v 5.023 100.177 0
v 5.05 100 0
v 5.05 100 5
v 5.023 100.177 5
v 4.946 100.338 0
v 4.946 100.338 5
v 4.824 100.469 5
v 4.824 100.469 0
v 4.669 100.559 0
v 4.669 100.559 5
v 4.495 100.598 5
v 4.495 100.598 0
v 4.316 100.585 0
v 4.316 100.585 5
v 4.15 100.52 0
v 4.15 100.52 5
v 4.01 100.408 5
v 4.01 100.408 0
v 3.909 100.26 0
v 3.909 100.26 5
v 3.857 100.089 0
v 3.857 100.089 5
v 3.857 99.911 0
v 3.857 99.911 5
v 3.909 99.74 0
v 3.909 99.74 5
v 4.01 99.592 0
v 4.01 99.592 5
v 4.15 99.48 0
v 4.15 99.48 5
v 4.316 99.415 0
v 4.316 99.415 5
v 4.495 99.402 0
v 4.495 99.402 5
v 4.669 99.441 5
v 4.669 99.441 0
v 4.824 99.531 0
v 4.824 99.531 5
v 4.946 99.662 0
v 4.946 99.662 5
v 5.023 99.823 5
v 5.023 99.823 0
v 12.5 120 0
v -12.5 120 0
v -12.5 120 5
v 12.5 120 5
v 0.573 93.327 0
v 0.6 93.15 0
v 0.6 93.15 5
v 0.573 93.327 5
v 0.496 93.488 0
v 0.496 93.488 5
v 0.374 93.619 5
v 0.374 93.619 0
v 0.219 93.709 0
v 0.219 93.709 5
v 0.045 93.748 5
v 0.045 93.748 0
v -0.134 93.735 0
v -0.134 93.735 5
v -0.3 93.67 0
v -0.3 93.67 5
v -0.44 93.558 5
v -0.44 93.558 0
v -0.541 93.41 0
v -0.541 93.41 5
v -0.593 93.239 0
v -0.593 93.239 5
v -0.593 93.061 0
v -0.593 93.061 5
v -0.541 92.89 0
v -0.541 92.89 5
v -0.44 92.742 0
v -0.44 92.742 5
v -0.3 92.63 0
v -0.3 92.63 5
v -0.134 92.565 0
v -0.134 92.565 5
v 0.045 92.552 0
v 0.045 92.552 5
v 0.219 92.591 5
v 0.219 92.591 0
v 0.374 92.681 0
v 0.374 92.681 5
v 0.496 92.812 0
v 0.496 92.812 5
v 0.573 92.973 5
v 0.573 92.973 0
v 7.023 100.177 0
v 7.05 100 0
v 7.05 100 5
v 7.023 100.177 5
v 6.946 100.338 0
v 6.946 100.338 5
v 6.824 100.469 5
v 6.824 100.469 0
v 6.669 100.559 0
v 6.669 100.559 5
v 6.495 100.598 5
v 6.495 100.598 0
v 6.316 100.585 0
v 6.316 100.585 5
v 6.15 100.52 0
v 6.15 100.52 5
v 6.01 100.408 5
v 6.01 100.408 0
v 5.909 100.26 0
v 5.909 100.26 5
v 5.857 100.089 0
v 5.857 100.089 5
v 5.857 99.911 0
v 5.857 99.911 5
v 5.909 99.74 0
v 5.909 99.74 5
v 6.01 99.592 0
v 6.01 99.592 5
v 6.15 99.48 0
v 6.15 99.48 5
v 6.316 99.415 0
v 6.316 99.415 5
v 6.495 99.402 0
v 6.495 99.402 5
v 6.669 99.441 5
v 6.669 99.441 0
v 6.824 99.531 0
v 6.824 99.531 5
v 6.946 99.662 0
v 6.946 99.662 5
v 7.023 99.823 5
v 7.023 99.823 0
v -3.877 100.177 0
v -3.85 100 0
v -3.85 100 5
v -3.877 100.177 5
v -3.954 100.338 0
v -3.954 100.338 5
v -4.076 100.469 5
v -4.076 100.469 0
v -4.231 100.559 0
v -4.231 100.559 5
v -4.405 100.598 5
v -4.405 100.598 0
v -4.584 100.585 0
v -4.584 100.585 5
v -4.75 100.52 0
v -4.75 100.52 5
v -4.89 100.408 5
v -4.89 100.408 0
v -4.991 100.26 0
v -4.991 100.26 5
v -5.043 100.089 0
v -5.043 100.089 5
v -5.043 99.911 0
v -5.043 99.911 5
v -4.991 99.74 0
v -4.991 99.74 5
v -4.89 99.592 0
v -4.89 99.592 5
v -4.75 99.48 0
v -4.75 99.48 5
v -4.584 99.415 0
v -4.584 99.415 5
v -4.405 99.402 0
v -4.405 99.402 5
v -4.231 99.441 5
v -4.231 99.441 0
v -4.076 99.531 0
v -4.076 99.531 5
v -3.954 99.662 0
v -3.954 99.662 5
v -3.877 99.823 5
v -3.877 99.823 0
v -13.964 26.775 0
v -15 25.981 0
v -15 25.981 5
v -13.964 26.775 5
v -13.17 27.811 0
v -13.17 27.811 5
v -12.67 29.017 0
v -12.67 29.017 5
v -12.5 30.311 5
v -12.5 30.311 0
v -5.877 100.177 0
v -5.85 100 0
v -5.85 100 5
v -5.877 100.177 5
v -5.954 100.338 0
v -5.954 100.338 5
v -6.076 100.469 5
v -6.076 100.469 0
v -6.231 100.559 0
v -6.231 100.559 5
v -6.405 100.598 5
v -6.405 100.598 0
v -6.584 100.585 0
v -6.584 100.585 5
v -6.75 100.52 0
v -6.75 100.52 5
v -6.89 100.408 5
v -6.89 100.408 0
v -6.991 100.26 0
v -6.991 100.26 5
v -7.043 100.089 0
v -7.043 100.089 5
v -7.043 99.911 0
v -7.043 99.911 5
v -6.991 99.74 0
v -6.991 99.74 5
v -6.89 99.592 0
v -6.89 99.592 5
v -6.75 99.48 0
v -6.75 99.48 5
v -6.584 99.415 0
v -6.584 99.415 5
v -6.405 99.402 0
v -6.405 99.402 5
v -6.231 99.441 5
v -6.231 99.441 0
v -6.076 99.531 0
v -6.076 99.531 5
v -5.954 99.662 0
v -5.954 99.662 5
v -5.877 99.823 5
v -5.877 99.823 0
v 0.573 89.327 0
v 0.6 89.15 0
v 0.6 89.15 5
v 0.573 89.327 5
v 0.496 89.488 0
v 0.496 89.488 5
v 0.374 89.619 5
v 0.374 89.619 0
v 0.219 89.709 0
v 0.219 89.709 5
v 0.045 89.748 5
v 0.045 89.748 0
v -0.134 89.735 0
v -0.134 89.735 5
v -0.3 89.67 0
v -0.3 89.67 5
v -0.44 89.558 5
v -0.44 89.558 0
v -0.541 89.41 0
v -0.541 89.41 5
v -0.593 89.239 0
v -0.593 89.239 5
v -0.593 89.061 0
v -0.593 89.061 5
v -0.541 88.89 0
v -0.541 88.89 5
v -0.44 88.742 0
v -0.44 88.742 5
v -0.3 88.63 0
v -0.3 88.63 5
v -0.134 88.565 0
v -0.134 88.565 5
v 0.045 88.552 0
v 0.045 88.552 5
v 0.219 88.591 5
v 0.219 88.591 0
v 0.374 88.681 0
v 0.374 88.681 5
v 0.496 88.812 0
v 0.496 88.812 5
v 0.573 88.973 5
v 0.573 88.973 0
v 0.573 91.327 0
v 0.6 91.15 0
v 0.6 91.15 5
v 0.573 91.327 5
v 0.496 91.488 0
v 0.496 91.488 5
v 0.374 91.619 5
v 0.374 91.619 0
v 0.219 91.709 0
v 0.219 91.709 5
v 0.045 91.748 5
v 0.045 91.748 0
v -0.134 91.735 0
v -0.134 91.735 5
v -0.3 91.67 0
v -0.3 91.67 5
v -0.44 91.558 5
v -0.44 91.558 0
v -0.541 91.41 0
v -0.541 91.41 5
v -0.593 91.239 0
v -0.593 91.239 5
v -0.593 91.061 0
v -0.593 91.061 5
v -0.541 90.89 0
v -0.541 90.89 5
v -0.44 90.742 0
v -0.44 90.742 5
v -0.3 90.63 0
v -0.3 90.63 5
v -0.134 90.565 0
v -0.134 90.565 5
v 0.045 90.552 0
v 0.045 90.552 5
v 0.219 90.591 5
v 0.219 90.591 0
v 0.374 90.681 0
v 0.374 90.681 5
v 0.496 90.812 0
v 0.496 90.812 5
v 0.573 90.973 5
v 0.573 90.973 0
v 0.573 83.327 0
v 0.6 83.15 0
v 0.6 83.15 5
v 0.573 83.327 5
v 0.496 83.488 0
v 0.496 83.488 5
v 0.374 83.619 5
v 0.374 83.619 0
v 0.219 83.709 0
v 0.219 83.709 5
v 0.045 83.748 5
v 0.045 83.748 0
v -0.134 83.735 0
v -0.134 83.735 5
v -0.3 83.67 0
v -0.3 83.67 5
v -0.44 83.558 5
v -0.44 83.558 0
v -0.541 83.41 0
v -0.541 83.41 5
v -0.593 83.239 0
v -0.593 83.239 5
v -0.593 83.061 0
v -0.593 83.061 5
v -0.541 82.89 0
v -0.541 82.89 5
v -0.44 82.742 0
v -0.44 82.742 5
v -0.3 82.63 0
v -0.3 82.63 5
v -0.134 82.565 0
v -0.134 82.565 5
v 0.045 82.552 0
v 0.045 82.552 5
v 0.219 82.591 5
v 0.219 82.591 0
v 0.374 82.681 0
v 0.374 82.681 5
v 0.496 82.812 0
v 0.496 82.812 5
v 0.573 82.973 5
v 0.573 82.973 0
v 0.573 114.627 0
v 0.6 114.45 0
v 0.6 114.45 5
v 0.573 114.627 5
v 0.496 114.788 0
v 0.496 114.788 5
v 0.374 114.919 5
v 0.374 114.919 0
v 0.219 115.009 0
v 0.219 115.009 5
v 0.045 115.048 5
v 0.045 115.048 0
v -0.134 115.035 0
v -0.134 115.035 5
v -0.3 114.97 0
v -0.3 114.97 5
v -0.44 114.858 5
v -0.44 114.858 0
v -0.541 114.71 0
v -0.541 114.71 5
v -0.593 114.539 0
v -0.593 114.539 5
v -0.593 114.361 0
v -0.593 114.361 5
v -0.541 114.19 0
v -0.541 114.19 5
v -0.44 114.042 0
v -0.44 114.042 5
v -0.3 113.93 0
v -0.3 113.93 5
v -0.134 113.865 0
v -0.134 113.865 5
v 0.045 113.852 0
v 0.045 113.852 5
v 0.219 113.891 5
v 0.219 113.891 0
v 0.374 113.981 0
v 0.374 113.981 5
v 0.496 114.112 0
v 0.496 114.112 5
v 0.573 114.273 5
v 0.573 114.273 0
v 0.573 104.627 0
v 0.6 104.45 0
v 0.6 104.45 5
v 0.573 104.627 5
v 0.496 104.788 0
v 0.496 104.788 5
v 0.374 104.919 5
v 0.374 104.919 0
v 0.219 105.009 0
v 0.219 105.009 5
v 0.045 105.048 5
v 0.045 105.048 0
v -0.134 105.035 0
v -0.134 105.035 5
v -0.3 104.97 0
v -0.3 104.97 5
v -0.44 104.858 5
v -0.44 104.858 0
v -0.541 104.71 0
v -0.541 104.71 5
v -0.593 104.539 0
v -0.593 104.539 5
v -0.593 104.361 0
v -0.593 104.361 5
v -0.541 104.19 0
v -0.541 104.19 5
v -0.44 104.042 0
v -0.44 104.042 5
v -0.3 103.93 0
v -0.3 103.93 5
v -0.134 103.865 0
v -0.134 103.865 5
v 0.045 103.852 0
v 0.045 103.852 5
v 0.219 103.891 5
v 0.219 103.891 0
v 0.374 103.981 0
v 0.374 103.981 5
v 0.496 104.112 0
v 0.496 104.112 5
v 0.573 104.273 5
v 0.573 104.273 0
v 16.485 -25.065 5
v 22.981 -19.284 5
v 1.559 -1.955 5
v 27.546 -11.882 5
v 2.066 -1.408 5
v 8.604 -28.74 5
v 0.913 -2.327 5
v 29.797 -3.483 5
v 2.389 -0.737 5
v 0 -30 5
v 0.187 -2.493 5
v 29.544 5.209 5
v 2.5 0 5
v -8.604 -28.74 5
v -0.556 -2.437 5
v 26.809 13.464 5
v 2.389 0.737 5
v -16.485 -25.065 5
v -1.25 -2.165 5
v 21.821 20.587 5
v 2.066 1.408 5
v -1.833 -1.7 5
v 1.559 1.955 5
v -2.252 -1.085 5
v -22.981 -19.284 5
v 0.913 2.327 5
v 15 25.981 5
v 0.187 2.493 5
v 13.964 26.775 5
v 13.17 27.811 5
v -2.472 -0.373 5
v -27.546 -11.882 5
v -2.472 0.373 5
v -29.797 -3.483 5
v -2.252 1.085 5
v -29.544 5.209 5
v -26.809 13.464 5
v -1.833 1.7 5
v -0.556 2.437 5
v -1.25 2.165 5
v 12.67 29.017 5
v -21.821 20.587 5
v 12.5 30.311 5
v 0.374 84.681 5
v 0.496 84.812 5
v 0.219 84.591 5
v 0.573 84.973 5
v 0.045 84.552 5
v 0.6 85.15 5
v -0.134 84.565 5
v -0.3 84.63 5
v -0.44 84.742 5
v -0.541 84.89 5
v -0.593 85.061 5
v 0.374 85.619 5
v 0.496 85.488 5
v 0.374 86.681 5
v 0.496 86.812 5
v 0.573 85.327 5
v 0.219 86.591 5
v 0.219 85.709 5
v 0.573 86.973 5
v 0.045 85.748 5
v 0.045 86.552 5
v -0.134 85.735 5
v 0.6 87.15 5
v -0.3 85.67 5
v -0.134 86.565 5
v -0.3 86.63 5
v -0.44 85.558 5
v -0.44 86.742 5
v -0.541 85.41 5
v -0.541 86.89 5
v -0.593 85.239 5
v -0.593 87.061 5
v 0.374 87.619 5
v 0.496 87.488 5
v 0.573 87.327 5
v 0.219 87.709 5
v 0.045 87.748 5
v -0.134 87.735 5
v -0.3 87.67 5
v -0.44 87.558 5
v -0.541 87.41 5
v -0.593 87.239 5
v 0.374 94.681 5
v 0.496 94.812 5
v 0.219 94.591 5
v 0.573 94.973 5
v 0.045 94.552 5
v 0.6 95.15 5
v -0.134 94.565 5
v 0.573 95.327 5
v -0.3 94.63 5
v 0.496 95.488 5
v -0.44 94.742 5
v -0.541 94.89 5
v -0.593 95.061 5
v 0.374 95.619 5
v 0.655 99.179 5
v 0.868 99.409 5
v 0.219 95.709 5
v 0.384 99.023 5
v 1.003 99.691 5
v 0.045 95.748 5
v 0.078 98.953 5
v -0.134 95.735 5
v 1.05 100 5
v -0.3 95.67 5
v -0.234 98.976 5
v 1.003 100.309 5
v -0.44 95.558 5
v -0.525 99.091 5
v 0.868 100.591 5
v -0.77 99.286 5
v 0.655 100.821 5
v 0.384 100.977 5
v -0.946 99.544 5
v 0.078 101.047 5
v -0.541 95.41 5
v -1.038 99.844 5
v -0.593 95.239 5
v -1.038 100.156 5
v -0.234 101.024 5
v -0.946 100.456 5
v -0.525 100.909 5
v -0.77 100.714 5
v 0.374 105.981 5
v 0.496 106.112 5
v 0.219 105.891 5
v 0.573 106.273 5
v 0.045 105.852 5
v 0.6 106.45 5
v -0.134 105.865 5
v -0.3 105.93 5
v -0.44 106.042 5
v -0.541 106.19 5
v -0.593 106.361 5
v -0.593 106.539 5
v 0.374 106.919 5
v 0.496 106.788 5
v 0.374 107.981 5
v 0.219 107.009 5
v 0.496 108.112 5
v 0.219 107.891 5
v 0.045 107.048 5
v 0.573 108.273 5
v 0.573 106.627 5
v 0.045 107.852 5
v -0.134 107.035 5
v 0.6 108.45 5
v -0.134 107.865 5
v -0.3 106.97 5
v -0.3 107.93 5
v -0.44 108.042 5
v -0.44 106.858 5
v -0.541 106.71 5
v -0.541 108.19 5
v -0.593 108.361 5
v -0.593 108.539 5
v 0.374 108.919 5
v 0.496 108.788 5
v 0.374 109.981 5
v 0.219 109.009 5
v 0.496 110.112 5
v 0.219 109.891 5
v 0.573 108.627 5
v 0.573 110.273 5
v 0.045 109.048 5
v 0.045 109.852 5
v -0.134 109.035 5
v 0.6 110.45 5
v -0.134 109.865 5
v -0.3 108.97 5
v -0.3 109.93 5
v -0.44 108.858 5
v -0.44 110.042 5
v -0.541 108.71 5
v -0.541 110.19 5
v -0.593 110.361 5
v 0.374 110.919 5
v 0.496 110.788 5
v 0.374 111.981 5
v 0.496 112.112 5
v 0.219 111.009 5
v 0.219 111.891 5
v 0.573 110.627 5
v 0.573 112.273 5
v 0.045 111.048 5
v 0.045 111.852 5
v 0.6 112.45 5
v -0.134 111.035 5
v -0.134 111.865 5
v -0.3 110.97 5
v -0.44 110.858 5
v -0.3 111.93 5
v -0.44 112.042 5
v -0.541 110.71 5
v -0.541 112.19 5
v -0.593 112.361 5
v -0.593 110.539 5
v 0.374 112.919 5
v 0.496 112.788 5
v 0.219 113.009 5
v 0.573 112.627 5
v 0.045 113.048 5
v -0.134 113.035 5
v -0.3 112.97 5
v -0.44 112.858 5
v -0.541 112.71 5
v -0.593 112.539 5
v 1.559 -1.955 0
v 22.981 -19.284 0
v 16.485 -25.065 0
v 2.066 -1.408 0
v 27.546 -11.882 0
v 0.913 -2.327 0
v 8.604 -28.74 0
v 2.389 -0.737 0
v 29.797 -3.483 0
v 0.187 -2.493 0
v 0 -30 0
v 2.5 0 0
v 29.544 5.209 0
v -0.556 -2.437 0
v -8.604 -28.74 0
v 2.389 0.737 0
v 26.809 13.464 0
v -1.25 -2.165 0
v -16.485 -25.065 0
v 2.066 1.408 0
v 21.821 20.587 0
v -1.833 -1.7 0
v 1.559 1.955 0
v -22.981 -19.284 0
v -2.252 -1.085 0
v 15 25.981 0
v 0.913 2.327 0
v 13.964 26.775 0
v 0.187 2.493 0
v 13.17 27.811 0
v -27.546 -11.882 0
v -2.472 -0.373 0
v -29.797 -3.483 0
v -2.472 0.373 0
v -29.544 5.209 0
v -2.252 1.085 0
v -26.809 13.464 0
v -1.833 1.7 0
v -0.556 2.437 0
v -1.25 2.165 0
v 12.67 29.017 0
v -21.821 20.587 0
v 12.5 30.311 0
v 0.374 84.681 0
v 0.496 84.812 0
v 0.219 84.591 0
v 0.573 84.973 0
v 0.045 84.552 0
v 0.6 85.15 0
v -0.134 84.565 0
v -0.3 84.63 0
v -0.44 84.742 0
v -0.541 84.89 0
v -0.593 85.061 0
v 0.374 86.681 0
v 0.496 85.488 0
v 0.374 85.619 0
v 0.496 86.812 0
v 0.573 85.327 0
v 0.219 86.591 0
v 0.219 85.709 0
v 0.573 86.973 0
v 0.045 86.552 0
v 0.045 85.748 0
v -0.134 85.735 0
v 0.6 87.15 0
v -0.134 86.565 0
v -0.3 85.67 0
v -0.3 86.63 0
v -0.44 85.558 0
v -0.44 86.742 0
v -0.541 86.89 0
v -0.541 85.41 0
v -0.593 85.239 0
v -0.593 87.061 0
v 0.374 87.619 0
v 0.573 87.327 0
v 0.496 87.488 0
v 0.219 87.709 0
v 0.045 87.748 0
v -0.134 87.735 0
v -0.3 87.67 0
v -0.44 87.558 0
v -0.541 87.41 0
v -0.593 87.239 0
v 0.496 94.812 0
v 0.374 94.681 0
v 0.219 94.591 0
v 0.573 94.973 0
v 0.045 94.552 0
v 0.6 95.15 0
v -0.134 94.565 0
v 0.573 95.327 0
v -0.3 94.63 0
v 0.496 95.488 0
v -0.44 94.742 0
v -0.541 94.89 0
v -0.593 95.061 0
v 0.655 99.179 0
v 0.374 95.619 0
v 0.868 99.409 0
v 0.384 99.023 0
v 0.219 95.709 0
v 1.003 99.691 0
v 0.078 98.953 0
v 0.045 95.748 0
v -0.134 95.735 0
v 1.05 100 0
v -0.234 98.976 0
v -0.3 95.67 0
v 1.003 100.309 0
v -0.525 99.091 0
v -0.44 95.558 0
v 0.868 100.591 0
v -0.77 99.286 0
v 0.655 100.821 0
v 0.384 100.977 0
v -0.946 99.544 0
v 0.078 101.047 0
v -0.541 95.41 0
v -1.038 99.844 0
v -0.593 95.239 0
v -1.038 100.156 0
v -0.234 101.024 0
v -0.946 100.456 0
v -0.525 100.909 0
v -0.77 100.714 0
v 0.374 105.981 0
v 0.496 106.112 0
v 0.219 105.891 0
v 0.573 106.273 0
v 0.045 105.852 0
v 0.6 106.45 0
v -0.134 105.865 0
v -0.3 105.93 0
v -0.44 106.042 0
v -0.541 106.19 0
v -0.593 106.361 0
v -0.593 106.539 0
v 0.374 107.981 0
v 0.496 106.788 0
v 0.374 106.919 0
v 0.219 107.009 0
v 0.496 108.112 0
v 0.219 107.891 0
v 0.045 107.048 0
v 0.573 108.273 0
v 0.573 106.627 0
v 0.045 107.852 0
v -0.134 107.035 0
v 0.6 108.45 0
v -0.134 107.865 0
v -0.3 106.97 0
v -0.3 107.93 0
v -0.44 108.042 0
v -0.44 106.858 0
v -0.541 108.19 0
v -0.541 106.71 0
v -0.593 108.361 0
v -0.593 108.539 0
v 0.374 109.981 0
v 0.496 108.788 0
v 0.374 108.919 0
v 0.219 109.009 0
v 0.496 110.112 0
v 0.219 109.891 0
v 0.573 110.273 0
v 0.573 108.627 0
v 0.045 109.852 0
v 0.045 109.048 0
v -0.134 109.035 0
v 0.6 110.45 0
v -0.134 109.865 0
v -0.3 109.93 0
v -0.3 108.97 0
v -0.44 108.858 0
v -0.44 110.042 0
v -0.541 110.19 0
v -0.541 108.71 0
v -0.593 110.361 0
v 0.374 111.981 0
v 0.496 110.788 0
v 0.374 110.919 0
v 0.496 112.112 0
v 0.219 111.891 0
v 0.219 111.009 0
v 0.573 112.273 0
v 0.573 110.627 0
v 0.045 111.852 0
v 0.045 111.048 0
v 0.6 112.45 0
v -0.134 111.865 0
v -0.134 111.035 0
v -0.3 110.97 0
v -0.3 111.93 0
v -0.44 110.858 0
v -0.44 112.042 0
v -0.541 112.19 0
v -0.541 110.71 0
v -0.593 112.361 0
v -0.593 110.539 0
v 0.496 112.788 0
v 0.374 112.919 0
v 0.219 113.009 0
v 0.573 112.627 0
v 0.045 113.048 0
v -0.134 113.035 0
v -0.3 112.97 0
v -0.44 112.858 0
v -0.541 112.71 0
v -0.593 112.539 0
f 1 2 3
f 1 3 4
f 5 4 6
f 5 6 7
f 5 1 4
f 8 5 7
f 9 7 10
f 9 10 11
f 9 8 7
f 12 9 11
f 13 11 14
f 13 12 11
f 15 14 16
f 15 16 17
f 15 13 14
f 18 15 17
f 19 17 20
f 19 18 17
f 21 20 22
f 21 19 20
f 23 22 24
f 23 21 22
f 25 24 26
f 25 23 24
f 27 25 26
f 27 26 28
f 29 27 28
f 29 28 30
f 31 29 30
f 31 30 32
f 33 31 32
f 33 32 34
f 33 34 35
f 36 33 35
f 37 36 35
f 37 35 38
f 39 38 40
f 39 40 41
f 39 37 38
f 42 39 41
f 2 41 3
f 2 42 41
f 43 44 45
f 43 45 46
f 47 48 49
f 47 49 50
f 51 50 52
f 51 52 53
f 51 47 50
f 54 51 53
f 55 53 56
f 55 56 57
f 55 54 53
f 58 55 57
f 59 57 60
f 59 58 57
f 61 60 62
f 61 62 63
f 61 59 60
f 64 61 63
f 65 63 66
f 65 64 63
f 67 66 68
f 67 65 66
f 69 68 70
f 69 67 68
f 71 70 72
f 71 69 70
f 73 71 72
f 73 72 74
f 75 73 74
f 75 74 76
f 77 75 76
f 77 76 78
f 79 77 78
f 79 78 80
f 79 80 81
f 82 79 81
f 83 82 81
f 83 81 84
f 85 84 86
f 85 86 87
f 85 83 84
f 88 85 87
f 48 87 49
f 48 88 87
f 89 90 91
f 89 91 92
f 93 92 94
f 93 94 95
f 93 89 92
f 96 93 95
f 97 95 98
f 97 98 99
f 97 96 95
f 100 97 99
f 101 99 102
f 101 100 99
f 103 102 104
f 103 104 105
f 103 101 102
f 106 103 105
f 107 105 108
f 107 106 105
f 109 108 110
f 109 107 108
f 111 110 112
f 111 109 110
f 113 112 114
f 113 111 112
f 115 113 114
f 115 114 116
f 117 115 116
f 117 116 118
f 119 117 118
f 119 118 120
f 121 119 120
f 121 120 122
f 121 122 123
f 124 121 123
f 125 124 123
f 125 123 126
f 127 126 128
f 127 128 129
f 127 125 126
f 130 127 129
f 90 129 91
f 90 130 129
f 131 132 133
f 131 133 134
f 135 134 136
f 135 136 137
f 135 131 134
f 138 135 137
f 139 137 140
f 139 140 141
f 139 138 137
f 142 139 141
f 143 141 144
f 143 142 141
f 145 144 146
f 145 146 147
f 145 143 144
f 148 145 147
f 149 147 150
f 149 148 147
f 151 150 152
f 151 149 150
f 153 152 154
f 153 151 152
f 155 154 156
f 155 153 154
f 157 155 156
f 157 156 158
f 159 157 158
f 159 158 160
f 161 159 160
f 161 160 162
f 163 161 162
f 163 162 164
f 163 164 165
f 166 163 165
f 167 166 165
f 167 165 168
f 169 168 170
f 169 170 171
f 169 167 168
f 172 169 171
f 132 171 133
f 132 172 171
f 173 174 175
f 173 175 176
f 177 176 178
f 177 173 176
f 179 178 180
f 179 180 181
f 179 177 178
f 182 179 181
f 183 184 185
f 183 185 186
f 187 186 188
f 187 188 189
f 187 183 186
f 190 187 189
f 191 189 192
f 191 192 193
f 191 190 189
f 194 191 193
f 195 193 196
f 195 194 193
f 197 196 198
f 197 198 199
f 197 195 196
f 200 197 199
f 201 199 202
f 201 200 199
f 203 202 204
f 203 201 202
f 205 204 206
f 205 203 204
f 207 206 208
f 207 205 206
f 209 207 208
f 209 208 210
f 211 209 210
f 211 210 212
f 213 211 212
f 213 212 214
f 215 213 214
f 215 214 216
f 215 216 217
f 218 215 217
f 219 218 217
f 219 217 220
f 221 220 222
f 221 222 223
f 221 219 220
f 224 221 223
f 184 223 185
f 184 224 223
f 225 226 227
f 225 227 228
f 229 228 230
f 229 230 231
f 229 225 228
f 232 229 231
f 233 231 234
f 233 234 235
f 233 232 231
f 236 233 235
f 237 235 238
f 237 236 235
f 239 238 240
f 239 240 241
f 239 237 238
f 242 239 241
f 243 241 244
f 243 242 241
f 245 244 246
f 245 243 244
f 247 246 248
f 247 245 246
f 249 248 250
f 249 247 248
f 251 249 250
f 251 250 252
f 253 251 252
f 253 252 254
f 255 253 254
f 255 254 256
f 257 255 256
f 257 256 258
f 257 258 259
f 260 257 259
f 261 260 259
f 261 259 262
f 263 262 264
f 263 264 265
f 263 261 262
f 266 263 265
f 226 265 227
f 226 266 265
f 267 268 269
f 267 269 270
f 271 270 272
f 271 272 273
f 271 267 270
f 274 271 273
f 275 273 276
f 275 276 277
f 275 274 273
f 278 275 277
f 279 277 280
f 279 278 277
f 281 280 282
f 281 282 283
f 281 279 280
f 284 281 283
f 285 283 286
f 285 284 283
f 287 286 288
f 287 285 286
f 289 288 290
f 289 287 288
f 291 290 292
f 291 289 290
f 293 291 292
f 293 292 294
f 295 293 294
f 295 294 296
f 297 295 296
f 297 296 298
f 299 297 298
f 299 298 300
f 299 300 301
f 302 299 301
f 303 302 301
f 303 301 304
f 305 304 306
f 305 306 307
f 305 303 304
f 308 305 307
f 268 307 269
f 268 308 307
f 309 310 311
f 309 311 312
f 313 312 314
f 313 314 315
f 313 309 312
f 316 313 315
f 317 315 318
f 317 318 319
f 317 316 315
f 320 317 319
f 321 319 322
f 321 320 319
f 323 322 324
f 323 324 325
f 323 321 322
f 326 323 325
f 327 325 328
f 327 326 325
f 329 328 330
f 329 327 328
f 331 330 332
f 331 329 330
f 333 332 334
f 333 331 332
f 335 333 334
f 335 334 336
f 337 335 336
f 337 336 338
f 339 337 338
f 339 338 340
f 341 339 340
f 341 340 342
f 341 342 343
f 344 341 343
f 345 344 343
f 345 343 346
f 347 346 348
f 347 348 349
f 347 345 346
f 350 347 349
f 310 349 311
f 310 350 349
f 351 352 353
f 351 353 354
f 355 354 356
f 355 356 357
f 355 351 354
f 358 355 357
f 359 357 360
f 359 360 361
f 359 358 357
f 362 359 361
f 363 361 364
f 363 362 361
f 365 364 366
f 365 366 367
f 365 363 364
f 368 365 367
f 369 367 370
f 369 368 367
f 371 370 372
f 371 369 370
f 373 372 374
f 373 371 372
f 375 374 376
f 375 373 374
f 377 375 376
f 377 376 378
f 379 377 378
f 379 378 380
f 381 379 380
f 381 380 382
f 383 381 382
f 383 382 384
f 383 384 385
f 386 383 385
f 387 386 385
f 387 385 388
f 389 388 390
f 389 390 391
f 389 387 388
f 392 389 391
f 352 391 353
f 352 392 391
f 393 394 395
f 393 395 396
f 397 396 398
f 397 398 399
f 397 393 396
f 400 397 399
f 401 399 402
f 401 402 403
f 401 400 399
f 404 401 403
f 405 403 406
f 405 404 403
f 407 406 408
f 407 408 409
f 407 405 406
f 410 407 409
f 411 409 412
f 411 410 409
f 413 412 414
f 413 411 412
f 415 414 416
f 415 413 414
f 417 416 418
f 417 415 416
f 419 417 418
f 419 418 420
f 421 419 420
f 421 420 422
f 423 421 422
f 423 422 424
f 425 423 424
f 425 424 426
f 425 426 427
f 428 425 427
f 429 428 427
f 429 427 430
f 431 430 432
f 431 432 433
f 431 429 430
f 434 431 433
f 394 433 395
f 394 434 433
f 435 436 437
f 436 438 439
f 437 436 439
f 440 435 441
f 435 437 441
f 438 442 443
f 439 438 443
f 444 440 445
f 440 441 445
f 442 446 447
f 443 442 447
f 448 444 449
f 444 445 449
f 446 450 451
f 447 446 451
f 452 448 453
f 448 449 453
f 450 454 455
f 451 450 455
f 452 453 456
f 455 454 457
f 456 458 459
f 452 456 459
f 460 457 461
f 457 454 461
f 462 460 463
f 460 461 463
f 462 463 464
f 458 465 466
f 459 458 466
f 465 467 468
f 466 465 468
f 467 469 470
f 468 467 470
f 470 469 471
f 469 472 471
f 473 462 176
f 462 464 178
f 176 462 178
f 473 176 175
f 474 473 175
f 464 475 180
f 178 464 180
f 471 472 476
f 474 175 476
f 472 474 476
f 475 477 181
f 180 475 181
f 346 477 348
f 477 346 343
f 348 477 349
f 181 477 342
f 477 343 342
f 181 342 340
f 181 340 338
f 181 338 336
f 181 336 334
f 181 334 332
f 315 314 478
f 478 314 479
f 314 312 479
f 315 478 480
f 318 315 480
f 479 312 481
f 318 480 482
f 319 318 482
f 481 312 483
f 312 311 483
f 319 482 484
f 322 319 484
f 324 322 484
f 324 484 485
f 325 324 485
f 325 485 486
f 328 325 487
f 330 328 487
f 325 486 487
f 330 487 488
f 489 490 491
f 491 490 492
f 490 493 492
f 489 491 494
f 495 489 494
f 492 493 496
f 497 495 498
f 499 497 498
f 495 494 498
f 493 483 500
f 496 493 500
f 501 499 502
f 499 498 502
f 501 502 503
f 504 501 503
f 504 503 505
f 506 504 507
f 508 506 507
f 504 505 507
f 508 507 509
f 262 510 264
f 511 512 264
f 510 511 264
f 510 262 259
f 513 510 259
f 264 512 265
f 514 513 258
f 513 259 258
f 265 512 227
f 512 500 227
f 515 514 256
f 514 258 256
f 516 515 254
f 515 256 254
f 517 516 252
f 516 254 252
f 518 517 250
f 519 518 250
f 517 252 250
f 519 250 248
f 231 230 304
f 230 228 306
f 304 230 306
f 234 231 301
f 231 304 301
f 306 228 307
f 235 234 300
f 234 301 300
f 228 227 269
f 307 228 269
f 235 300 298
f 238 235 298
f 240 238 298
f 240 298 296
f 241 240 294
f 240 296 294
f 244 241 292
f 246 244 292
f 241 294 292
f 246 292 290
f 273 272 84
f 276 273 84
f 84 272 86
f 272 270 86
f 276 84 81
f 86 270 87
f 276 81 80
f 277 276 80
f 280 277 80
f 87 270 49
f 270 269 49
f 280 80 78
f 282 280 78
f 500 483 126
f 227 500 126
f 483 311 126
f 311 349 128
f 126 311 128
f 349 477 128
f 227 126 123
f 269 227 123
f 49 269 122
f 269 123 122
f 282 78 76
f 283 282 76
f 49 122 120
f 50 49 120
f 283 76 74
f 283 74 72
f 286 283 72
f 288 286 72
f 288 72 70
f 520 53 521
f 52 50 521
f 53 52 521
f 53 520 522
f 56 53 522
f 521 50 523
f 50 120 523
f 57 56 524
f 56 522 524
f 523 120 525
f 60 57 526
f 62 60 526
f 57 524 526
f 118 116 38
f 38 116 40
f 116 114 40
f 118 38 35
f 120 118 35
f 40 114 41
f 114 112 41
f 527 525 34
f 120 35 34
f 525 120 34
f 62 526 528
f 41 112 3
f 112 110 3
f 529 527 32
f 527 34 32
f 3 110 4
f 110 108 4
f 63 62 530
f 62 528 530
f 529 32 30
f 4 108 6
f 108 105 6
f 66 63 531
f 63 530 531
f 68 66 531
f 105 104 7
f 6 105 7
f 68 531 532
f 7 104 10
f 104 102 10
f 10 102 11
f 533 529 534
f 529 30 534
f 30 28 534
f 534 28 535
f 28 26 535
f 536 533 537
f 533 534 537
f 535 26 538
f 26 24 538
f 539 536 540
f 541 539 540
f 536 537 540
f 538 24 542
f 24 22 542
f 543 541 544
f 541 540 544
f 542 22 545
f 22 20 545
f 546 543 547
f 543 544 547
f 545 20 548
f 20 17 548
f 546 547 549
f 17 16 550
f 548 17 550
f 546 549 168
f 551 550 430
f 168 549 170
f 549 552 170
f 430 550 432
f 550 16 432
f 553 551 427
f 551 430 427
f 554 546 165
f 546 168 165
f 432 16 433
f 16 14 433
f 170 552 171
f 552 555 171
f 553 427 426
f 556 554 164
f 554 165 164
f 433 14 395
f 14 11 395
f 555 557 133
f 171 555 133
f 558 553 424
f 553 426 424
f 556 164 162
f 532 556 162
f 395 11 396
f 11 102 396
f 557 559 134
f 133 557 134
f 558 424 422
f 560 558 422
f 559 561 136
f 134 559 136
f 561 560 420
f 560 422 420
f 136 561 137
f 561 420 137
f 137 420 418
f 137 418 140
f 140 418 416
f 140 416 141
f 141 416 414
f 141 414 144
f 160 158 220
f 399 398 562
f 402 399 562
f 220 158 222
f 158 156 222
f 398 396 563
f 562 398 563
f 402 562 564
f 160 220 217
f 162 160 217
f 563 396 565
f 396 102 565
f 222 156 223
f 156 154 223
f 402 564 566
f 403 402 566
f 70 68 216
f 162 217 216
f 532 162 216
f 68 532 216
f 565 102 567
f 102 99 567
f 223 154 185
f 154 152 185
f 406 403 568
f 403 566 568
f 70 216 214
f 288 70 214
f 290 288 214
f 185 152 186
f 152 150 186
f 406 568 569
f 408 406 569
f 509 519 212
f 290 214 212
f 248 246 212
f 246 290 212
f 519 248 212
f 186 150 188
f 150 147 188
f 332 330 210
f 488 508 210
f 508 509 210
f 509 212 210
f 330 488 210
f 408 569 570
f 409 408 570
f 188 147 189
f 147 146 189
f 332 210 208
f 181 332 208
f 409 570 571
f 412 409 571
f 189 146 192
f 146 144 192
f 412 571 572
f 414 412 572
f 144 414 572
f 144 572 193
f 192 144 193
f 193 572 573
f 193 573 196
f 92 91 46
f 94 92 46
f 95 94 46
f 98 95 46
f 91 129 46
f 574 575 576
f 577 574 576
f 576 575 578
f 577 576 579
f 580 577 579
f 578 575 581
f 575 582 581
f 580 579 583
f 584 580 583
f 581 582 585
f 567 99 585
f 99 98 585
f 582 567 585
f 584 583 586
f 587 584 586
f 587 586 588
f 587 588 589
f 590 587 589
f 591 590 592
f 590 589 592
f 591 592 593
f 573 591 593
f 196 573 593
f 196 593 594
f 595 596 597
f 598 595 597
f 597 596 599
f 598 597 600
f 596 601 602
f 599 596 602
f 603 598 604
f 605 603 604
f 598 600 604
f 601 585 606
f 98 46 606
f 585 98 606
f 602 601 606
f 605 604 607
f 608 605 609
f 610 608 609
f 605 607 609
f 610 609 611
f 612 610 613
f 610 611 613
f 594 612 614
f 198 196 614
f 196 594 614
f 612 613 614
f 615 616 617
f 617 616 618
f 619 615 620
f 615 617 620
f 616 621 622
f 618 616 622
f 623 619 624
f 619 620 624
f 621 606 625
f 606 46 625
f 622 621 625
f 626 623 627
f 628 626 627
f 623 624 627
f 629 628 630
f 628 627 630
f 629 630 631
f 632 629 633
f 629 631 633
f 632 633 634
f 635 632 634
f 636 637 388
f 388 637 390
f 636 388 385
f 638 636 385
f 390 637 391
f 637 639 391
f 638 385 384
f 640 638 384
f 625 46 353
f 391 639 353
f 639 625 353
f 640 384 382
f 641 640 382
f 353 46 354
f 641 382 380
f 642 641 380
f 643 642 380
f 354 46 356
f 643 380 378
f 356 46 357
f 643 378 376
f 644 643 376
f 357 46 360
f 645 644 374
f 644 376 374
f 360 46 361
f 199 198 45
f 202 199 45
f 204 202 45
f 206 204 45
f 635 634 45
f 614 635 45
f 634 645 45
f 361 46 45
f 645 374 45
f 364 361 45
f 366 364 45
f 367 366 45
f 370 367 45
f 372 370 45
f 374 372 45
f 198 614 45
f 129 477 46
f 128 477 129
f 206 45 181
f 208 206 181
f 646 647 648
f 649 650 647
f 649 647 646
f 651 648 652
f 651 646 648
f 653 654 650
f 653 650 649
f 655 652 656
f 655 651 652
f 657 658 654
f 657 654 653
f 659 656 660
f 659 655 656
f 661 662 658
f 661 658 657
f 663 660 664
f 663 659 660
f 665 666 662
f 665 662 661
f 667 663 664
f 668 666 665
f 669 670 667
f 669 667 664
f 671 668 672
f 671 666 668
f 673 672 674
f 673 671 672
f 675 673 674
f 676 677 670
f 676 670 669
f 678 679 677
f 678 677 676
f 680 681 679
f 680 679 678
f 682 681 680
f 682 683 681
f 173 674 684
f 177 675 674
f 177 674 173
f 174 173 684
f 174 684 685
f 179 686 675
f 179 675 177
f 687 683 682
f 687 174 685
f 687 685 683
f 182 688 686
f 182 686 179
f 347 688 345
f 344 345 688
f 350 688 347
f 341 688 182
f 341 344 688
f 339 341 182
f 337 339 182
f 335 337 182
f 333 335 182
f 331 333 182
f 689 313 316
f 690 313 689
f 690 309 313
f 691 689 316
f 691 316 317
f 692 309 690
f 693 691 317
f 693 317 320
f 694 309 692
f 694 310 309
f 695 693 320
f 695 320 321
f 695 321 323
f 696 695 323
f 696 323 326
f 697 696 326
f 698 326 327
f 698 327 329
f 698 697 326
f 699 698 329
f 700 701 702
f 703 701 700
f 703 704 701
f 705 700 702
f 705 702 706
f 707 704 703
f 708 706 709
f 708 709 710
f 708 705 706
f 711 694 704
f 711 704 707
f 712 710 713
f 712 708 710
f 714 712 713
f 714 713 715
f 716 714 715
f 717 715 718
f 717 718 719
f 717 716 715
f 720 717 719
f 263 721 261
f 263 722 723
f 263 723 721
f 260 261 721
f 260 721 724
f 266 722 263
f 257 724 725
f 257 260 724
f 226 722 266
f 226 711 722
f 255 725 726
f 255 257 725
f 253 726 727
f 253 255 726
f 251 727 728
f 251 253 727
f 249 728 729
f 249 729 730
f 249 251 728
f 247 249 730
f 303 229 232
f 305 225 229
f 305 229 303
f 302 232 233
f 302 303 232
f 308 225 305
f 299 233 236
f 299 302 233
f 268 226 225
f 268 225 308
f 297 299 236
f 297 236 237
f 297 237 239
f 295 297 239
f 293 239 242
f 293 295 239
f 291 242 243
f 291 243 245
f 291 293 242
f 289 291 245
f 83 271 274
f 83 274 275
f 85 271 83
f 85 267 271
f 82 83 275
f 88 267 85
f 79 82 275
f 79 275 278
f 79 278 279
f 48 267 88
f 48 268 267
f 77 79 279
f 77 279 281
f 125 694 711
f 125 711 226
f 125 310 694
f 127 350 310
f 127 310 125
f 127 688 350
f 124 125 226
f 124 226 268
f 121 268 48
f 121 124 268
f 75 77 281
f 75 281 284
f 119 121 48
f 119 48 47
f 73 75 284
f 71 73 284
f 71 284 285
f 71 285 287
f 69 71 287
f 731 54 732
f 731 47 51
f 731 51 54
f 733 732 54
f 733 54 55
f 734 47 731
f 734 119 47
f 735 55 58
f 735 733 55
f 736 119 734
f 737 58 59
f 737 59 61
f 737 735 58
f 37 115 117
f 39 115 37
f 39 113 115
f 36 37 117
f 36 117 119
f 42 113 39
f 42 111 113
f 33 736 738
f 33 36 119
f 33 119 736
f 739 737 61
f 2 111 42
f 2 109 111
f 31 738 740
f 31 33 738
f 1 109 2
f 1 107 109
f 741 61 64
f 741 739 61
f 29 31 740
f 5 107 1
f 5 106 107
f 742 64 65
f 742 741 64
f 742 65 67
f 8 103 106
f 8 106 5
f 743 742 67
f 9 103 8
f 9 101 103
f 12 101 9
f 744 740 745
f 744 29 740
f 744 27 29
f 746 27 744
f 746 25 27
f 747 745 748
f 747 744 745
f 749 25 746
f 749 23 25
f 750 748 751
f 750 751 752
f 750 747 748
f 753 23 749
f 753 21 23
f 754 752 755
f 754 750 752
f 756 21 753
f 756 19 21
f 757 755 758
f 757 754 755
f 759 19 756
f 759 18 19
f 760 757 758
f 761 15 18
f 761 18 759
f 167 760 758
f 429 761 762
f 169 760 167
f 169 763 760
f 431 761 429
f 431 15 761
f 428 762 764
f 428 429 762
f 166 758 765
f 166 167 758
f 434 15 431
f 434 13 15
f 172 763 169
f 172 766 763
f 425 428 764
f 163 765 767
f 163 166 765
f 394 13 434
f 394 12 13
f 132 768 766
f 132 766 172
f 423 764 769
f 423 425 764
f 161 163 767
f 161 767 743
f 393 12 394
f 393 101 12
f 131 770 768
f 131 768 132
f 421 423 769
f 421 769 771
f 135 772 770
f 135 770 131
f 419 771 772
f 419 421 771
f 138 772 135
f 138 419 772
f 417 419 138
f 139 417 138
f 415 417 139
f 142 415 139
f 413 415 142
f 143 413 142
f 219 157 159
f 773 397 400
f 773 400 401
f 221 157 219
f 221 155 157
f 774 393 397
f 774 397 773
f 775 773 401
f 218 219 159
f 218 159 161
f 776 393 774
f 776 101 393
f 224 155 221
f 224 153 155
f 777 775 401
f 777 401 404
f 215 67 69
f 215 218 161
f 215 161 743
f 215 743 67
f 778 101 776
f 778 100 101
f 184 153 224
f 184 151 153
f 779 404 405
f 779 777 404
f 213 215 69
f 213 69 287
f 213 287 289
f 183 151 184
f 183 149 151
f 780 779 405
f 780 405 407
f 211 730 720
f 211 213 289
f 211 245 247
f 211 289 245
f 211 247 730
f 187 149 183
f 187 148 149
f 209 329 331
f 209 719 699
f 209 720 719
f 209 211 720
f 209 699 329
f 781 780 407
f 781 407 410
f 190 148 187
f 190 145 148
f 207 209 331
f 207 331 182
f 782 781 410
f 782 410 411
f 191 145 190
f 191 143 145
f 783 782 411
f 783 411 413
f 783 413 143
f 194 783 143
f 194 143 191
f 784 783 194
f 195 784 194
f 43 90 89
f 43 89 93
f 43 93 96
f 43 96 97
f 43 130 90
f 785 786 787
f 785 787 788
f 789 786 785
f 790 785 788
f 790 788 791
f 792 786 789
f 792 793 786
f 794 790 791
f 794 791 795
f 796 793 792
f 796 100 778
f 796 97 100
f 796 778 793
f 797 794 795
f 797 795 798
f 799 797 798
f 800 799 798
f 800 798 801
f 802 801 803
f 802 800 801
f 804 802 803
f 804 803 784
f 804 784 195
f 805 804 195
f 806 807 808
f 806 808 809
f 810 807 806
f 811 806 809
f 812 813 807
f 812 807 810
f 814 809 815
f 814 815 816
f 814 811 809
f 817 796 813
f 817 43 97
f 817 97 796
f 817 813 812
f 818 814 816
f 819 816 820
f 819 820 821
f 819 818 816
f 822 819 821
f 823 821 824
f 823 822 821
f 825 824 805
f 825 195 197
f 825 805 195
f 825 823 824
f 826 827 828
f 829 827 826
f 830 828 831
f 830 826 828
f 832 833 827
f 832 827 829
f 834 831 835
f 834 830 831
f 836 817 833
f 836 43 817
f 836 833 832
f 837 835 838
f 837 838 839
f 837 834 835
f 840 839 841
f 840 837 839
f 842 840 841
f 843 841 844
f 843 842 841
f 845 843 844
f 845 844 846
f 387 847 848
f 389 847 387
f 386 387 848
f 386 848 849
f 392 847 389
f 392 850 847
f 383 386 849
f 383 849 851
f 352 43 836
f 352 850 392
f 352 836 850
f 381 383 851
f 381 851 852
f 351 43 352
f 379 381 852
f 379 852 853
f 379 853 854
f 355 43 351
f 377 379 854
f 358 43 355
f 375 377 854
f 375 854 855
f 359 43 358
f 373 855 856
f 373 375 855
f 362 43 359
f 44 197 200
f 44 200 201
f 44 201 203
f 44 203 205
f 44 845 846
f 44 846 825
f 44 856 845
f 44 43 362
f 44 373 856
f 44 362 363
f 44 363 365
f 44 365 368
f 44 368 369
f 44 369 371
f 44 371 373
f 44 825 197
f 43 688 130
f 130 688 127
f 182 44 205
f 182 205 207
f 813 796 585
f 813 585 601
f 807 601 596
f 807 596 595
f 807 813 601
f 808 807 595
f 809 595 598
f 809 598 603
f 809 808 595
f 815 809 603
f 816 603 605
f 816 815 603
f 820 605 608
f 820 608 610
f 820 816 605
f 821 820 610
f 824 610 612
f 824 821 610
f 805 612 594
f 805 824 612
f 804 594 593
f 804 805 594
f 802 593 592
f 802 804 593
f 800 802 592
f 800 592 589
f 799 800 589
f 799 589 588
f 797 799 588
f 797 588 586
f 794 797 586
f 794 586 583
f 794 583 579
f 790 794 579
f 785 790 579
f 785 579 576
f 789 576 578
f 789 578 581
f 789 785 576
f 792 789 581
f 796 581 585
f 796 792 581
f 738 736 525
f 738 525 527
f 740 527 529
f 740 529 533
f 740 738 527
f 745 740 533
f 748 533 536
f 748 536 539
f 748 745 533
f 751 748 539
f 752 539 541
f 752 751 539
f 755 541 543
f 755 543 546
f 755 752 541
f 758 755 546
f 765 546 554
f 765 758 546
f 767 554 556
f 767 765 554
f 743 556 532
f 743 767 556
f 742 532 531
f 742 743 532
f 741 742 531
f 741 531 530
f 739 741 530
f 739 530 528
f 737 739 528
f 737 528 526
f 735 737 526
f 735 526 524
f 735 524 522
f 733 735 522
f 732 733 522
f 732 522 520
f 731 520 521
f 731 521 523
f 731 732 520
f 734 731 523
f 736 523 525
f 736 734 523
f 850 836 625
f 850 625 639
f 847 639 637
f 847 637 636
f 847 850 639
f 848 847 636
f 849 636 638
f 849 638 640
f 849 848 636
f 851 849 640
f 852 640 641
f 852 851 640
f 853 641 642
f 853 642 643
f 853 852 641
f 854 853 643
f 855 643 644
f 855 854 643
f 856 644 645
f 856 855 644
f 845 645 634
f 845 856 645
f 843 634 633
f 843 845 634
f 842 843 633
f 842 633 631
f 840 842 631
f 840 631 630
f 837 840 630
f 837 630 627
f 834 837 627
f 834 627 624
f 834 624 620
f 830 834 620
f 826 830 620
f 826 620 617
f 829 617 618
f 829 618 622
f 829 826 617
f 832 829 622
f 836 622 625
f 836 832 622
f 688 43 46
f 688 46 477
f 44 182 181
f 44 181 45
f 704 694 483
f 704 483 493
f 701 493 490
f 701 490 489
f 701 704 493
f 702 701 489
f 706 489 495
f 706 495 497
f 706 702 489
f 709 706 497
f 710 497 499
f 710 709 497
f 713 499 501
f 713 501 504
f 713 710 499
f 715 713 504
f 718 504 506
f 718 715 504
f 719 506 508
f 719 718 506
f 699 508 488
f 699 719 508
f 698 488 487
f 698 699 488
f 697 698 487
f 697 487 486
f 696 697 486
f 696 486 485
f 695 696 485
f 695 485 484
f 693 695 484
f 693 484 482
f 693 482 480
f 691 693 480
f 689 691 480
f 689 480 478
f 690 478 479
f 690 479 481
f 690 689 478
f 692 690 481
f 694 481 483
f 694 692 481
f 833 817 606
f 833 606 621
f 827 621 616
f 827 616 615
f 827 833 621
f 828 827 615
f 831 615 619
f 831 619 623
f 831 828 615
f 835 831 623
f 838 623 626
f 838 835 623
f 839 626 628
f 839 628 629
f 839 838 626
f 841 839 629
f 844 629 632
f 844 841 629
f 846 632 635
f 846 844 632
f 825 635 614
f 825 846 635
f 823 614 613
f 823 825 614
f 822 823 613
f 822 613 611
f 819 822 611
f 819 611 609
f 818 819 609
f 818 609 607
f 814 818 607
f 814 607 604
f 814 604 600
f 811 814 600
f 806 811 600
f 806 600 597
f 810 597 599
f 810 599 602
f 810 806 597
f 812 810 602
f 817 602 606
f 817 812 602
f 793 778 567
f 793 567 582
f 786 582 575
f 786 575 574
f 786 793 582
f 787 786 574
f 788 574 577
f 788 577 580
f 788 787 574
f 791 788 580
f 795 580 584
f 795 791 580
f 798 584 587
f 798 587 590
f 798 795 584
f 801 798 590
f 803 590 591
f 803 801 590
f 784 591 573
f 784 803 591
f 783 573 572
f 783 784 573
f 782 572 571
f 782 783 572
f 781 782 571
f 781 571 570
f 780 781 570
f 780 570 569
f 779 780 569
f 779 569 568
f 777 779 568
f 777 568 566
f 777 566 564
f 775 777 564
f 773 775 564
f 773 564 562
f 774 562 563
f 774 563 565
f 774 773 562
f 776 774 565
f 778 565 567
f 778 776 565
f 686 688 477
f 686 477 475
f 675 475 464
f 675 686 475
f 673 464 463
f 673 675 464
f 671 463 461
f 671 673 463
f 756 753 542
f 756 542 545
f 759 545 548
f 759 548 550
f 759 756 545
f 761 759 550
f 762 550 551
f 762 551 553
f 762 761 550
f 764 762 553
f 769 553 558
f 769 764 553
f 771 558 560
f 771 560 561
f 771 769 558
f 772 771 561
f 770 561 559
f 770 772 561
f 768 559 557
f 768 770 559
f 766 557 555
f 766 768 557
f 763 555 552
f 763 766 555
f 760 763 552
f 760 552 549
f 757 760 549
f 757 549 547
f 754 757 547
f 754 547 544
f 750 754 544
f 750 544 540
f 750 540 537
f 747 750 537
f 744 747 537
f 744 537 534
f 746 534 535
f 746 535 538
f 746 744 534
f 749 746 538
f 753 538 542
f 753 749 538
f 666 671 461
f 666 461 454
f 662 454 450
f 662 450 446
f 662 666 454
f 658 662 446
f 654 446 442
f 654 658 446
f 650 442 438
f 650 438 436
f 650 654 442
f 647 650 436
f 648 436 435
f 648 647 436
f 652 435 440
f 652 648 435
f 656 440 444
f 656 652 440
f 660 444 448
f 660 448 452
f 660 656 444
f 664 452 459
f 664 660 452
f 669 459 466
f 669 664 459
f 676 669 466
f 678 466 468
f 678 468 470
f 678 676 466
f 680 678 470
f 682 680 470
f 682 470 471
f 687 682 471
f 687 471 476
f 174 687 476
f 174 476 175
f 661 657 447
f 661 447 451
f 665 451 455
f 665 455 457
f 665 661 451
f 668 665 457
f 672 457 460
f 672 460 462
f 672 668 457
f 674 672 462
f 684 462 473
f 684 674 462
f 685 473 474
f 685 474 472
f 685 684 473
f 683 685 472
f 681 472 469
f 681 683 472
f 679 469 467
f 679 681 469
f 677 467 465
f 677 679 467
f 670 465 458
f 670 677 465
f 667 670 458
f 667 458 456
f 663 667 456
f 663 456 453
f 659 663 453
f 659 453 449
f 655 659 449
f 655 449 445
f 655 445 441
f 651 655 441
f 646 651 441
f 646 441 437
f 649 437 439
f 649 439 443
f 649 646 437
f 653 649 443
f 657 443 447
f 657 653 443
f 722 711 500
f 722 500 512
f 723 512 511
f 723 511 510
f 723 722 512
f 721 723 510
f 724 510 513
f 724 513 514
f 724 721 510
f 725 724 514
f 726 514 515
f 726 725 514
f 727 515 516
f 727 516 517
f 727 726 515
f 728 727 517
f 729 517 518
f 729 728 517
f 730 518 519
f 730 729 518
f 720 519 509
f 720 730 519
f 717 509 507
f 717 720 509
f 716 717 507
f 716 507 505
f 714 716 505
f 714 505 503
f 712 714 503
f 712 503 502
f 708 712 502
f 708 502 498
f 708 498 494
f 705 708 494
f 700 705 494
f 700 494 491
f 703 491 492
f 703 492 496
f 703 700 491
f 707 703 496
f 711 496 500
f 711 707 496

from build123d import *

# Parameters (mm, degrees)
SKETCH1_R           = 1.05
SKETCH1_R_2         = 0.6
SKETCH1_R_3         = 2.5
BOSS_EXTRUDE1_DEPTH = 5


with BuildPart() as part:
    # Sketch1 → Boss-Extrude1 (new body)
    with BuildSketch(Plane.XY):
        with BuildLine():
            Line((-12.5, 120), (12.5, 120))
            Line((12.5, 120), (12.5, 30.310889132))
            ThreePointArc((12.5, 30.310889132), (13.169872981, 27.810889132), (15, 25.980762114))
            ThreePointArc((15, 25.980762114), (0, -30), (-15, 25.980762114))
            ThreePointArc((-15, 25.980762114), (-13.169872981, 27.810889132), (-12.5, 30.310889132))
            Line((-12.5, 30.310889132), (-12.5, 120))
        make_face()
        with Locations((0, 100)):
            Circle(SKETCH1_R, mode=Mode.SUBTRACT)
        with Locations((0, 95.15)):
            Circle(SKETCH1_R_2, mode=Mode.SUBTRACT)
        with Locations((0, 93.15)):
            Circle(SKETCH1_R_2, mode=Mode.SUBTRACT)
        with Locations((0, 91.15)):
            Circle(SKETCH1_R_2, mode=Mode.SUBTRACT)
        with Locations((0, 89.15)):
            Circle(SKETCH1_R_2, mode=Mode.SUBTRACT)
        with Locations((0, 87.15)):
            Circle(SKETCH1_R_2, mode=Mode.SUBTRACT)
        with Locations((0, 85.15)):
            Circle(SKETCH1_R_2, mode=Mode.SUBTRACT)
        with Locations((0, 83.15)):
            Circle(SKETCH1_R_2, mode=Mode.SUBTRACT)
        with Locations((6.45, 100)):
            Circle(SKETCH1_R_2, mode=Mode.SUBTRACT)
        with Locations((4.45, 100)):
            Circle(SKETCH1_R_2, mode=Mode.SUBTRACT)
        with Locations((-4.45, 100)):
            Circle(SKETCH1_R_2, mode=Mode.SUBTRACT)
        with Locations((-6.45, 100)):
            Circle(SKETCH1_R_2, mode=Mode.SUBTRACT)
        with Locations((0, 104.45)):
            Circle(SKETCH1_R_2, mode=Mode.SUBTRACT)
        with Locations((0, 106.45)):
            Circle(SKETCH1_R_2, mode=Mode.SUBTRACT)
        with Locations((0, 108.45)):
            Circle(SKETCH1_R_2, mode=Mode.SUBTRACT)
        with Locations((0, 110.45)):
            Circle(SKETCH1_R_2, mode=Mode.SUBTRACT)
        with Locations((0, 112.45)):
            Circle(SKETCH1_R_2, mode=Mode.SUBTRACT)
        with Locations((0, 114.45)):
            Circle(SKETCH1_R_2, mode=Mode.SUBTRACT)
        Circle(SKETCH1_R_3, mode=Mode.SUBTRACT)
    extrude(amount=BOSS_EXTRUDE1_DEPTH)


solid = part.part
